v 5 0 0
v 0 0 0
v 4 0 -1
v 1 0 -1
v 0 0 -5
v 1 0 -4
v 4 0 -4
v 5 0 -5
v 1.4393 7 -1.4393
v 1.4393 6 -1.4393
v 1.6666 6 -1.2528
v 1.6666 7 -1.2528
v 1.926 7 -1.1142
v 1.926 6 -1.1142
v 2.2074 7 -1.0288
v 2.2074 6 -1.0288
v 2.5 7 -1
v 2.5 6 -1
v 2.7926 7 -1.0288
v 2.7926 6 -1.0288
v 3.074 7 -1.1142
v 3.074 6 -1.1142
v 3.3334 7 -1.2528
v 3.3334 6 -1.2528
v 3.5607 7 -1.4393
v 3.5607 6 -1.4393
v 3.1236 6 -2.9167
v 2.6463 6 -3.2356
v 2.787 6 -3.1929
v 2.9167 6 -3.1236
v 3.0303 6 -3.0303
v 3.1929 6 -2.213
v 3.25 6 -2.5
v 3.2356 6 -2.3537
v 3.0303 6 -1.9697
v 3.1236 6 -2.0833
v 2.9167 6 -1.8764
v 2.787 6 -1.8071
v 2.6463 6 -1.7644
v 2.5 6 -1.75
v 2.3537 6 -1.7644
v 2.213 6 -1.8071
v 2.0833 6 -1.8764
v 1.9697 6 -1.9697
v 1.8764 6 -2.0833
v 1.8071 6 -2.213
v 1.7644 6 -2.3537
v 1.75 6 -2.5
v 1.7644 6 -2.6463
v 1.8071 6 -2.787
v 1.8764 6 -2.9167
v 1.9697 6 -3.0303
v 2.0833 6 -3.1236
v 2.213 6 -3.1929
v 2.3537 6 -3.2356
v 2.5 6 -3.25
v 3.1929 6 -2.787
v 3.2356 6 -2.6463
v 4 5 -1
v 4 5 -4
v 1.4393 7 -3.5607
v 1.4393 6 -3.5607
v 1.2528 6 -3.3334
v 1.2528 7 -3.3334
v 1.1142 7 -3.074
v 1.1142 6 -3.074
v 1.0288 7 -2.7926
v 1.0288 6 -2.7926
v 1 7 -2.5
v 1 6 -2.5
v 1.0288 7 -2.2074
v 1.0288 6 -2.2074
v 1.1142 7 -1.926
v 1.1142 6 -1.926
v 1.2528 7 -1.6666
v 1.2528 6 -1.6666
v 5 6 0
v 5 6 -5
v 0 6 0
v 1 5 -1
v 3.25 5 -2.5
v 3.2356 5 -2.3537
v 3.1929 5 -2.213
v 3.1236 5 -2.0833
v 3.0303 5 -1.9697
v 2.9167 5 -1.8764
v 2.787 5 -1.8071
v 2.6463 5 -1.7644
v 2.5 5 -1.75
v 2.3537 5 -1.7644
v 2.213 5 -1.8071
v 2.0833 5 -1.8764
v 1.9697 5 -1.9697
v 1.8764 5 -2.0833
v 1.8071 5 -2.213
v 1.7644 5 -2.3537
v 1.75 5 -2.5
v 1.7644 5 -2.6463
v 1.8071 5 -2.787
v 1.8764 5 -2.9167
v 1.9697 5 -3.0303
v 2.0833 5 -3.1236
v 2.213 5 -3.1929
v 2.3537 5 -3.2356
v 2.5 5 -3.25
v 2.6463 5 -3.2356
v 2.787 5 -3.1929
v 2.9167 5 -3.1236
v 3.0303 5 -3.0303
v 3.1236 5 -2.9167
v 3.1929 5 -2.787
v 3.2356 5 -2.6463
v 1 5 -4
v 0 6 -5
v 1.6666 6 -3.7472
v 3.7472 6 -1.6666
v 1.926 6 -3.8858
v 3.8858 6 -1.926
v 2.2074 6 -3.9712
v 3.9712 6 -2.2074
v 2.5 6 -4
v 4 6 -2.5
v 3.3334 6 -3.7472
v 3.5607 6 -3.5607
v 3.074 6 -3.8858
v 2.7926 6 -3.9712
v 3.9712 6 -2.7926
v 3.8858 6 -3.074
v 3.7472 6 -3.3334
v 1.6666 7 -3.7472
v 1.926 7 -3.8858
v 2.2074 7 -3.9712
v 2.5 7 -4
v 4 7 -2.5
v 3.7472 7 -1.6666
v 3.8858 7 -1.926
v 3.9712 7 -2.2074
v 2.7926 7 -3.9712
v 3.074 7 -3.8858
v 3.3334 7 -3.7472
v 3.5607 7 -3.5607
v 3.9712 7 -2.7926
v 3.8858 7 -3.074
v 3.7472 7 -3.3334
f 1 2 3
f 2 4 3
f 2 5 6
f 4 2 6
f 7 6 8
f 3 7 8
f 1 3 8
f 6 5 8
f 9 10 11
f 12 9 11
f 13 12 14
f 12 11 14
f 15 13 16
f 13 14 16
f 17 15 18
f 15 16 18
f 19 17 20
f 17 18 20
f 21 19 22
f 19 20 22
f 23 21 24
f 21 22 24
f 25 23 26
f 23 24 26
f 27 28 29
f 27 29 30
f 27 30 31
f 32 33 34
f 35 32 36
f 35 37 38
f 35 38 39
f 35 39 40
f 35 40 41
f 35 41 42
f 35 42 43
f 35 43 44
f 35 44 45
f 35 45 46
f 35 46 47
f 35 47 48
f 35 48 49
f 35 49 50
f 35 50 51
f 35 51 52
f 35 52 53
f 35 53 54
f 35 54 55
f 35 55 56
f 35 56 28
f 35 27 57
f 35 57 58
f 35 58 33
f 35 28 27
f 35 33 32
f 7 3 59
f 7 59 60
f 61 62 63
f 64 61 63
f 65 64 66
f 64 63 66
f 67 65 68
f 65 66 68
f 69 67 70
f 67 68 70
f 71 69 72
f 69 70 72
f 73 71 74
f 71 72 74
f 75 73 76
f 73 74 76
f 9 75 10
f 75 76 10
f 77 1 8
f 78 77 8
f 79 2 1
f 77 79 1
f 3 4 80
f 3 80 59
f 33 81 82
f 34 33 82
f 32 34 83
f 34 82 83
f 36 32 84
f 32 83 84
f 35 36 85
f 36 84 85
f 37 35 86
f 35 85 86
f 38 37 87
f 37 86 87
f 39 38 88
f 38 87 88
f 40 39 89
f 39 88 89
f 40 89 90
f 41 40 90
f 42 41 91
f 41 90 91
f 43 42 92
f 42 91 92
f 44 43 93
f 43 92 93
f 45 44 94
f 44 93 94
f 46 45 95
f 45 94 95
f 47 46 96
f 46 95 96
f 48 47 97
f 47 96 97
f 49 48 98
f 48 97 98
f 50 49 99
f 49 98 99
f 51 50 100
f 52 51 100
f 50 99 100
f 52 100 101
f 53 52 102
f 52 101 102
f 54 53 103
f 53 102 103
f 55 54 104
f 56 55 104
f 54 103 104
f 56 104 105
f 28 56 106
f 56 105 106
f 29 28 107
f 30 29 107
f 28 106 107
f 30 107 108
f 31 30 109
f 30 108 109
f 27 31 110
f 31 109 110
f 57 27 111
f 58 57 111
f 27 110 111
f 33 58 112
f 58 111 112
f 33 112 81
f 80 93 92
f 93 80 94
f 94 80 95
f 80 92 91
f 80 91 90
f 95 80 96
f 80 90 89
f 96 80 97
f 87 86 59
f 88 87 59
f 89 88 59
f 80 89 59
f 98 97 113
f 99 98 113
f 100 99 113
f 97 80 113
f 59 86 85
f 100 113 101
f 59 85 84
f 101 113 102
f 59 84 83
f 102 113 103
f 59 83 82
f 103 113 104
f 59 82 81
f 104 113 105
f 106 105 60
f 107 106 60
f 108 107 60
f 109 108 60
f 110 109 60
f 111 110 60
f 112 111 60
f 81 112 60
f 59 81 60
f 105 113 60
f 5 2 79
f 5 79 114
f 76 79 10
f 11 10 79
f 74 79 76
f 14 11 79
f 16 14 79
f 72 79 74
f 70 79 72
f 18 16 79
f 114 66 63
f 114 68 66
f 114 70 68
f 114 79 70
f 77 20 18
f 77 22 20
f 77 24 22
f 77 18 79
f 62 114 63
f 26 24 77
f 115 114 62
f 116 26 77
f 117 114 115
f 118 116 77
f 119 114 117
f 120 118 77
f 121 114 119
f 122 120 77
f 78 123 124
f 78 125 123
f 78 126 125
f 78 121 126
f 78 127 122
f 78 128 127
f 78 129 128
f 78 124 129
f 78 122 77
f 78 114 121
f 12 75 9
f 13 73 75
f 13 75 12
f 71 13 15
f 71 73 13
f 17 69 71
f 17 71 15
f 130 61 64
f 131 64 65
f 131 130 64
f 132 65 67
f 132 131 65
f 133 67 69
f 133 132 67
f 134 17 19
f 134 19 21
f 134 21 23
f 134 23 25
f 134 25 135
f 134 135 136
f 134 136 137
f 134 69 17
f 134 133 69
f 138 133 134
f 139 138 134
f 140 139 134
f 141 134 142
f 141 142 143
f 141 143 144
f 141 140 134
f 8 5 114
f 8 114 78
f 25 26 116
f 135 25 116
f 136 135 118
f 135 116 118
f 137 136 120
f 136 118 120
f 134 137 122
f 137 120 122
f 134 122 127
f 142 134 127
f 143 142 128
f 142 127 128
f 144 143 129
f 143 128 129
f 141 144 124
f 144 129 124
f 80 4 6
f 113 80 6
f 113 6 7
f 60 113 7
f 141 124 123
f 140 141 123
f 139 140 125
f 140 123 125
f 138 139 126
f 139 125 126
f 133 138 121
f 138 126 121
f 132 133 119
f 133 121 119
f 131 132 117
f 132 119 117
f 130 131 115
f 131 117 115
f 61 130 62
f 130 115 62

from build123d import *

# Parameters (mm, degrees)
SKETCH1_W           = 5
SKETCH1_H           = 5
SKETCH1_W_2         = 3
SKETCH1_H_2         = 3
BOSS_EXTRUDE1_DEPTH = 6
BOSS_EXTRUDE2_REACH = 6
SKETCH2_W           = 3
SKETCH2_H           = 1
BOSS_EXTRUDE3_DEPTH = 1
SKETCH4_R           = 0.75
CUT_EXTRUDE2_DEPTH  = 1


with BuildPart() as part:
    # Sketch1 → Boss-Extrude1 (new body)
    with BuildSketch(Plane(origin=(0, 0, 0), x_dir=(1, 0, 0), z_dir=(0, 1, 0))):
        with Locations((2.5, 2.5)):
            Rectangle(SKETCH1_W, SKETCH1_H)
        with Locations((2.5, 2.5)):
            Rectangle(SKETCH1_W_2, SKETCH1_H_2, mode=Mode.SUBTRACT)
    extrude(amount=BOSS_EXTRUDE1_DEPTH)

    # Sketch2 → Boss-Extrude2 (add, up to next)
    with BuildSketch(Plane.XY.offset(-4), mode=Mode.PRIVATE) as boss_extrude2_sk1:
        with Locations((2.5, 5.5)):
            Rectangle(SKETCH2_W, SKETCH2_H)
    boss_extrude2_tool1 = extrude(boss_extrude2_sk1.sketch, amount=BOSS_EXTRUDE2_REACH, mode=Mode.PRIVATE) - part.part
    add(boss_extrude2_tool1.solids().sort_by_distance((2.5, 5.5, -4))[0])

    # Sketch3 → Boss-Extrude3 (add)
    with BuildSketch(Plane(origin=(0, 6, 0), x_dir=(1, 0, 0), z_dir=(0, 1, 0))):
        with BuildLine():
            ThreePointArc((3.560660172, 3.560660172), (2.5, 4), (1.439339828, 3.560660172))
            Line((1.439339828, 3.560660172), (2.5, 2.5))
            Line((2.5, 2.5), (3.560660172, 3.560660172))
        make_face()
        with BuildLine():
            Line((2.5, 2.5), (1.439339828, 3.560660172))
            ThreePointArc((1.439339828, 3.560660172), (1, 2.5), (1.439339828, 1.439339828))
            Line((1.439339828, 1.439339828), (2.5, 2.5))
        make_face()
        with BuildLine():
            Line((3.560660172, 3.560660172), (2.5, 2.5))
            Line((2.5, 2.5), (3.560660172, 1.439339828))
            ThreePointArc((3.560660172, 1.439339828), (3.885819299, 1.925974851), (4, 2.5))
            ThreePointArc((4, 2.5), (3.885819299, 3.074025149), (3.560660172, 3.560660172))
        make_face()
        with BuildLine():
            Line((3.560660172, 1.439339828), (2.5, 2.5))
            Line((2.5, 2.5), (1.439339828, 1.439339828))
            ThreePointArc((1.439339828, 1.439339828), (2.5, 1), (3.560660172, 1.439339828))
        make_face()
    extrude(amount=BOSS_EXTRUDE3_DEPTH)

    # Sketch4 → Cut-Extrude2 (cut)
    with BuildSketch(Plane.XZ.offset(-5)):
        with Locations((2.5, -2.5)):
            Circle(SKETCH4_R)
    extrude(amount=-CUT_EXTRUDE2_DEPTH, mode=Mode.SUBTRACT)


solid = part.part
